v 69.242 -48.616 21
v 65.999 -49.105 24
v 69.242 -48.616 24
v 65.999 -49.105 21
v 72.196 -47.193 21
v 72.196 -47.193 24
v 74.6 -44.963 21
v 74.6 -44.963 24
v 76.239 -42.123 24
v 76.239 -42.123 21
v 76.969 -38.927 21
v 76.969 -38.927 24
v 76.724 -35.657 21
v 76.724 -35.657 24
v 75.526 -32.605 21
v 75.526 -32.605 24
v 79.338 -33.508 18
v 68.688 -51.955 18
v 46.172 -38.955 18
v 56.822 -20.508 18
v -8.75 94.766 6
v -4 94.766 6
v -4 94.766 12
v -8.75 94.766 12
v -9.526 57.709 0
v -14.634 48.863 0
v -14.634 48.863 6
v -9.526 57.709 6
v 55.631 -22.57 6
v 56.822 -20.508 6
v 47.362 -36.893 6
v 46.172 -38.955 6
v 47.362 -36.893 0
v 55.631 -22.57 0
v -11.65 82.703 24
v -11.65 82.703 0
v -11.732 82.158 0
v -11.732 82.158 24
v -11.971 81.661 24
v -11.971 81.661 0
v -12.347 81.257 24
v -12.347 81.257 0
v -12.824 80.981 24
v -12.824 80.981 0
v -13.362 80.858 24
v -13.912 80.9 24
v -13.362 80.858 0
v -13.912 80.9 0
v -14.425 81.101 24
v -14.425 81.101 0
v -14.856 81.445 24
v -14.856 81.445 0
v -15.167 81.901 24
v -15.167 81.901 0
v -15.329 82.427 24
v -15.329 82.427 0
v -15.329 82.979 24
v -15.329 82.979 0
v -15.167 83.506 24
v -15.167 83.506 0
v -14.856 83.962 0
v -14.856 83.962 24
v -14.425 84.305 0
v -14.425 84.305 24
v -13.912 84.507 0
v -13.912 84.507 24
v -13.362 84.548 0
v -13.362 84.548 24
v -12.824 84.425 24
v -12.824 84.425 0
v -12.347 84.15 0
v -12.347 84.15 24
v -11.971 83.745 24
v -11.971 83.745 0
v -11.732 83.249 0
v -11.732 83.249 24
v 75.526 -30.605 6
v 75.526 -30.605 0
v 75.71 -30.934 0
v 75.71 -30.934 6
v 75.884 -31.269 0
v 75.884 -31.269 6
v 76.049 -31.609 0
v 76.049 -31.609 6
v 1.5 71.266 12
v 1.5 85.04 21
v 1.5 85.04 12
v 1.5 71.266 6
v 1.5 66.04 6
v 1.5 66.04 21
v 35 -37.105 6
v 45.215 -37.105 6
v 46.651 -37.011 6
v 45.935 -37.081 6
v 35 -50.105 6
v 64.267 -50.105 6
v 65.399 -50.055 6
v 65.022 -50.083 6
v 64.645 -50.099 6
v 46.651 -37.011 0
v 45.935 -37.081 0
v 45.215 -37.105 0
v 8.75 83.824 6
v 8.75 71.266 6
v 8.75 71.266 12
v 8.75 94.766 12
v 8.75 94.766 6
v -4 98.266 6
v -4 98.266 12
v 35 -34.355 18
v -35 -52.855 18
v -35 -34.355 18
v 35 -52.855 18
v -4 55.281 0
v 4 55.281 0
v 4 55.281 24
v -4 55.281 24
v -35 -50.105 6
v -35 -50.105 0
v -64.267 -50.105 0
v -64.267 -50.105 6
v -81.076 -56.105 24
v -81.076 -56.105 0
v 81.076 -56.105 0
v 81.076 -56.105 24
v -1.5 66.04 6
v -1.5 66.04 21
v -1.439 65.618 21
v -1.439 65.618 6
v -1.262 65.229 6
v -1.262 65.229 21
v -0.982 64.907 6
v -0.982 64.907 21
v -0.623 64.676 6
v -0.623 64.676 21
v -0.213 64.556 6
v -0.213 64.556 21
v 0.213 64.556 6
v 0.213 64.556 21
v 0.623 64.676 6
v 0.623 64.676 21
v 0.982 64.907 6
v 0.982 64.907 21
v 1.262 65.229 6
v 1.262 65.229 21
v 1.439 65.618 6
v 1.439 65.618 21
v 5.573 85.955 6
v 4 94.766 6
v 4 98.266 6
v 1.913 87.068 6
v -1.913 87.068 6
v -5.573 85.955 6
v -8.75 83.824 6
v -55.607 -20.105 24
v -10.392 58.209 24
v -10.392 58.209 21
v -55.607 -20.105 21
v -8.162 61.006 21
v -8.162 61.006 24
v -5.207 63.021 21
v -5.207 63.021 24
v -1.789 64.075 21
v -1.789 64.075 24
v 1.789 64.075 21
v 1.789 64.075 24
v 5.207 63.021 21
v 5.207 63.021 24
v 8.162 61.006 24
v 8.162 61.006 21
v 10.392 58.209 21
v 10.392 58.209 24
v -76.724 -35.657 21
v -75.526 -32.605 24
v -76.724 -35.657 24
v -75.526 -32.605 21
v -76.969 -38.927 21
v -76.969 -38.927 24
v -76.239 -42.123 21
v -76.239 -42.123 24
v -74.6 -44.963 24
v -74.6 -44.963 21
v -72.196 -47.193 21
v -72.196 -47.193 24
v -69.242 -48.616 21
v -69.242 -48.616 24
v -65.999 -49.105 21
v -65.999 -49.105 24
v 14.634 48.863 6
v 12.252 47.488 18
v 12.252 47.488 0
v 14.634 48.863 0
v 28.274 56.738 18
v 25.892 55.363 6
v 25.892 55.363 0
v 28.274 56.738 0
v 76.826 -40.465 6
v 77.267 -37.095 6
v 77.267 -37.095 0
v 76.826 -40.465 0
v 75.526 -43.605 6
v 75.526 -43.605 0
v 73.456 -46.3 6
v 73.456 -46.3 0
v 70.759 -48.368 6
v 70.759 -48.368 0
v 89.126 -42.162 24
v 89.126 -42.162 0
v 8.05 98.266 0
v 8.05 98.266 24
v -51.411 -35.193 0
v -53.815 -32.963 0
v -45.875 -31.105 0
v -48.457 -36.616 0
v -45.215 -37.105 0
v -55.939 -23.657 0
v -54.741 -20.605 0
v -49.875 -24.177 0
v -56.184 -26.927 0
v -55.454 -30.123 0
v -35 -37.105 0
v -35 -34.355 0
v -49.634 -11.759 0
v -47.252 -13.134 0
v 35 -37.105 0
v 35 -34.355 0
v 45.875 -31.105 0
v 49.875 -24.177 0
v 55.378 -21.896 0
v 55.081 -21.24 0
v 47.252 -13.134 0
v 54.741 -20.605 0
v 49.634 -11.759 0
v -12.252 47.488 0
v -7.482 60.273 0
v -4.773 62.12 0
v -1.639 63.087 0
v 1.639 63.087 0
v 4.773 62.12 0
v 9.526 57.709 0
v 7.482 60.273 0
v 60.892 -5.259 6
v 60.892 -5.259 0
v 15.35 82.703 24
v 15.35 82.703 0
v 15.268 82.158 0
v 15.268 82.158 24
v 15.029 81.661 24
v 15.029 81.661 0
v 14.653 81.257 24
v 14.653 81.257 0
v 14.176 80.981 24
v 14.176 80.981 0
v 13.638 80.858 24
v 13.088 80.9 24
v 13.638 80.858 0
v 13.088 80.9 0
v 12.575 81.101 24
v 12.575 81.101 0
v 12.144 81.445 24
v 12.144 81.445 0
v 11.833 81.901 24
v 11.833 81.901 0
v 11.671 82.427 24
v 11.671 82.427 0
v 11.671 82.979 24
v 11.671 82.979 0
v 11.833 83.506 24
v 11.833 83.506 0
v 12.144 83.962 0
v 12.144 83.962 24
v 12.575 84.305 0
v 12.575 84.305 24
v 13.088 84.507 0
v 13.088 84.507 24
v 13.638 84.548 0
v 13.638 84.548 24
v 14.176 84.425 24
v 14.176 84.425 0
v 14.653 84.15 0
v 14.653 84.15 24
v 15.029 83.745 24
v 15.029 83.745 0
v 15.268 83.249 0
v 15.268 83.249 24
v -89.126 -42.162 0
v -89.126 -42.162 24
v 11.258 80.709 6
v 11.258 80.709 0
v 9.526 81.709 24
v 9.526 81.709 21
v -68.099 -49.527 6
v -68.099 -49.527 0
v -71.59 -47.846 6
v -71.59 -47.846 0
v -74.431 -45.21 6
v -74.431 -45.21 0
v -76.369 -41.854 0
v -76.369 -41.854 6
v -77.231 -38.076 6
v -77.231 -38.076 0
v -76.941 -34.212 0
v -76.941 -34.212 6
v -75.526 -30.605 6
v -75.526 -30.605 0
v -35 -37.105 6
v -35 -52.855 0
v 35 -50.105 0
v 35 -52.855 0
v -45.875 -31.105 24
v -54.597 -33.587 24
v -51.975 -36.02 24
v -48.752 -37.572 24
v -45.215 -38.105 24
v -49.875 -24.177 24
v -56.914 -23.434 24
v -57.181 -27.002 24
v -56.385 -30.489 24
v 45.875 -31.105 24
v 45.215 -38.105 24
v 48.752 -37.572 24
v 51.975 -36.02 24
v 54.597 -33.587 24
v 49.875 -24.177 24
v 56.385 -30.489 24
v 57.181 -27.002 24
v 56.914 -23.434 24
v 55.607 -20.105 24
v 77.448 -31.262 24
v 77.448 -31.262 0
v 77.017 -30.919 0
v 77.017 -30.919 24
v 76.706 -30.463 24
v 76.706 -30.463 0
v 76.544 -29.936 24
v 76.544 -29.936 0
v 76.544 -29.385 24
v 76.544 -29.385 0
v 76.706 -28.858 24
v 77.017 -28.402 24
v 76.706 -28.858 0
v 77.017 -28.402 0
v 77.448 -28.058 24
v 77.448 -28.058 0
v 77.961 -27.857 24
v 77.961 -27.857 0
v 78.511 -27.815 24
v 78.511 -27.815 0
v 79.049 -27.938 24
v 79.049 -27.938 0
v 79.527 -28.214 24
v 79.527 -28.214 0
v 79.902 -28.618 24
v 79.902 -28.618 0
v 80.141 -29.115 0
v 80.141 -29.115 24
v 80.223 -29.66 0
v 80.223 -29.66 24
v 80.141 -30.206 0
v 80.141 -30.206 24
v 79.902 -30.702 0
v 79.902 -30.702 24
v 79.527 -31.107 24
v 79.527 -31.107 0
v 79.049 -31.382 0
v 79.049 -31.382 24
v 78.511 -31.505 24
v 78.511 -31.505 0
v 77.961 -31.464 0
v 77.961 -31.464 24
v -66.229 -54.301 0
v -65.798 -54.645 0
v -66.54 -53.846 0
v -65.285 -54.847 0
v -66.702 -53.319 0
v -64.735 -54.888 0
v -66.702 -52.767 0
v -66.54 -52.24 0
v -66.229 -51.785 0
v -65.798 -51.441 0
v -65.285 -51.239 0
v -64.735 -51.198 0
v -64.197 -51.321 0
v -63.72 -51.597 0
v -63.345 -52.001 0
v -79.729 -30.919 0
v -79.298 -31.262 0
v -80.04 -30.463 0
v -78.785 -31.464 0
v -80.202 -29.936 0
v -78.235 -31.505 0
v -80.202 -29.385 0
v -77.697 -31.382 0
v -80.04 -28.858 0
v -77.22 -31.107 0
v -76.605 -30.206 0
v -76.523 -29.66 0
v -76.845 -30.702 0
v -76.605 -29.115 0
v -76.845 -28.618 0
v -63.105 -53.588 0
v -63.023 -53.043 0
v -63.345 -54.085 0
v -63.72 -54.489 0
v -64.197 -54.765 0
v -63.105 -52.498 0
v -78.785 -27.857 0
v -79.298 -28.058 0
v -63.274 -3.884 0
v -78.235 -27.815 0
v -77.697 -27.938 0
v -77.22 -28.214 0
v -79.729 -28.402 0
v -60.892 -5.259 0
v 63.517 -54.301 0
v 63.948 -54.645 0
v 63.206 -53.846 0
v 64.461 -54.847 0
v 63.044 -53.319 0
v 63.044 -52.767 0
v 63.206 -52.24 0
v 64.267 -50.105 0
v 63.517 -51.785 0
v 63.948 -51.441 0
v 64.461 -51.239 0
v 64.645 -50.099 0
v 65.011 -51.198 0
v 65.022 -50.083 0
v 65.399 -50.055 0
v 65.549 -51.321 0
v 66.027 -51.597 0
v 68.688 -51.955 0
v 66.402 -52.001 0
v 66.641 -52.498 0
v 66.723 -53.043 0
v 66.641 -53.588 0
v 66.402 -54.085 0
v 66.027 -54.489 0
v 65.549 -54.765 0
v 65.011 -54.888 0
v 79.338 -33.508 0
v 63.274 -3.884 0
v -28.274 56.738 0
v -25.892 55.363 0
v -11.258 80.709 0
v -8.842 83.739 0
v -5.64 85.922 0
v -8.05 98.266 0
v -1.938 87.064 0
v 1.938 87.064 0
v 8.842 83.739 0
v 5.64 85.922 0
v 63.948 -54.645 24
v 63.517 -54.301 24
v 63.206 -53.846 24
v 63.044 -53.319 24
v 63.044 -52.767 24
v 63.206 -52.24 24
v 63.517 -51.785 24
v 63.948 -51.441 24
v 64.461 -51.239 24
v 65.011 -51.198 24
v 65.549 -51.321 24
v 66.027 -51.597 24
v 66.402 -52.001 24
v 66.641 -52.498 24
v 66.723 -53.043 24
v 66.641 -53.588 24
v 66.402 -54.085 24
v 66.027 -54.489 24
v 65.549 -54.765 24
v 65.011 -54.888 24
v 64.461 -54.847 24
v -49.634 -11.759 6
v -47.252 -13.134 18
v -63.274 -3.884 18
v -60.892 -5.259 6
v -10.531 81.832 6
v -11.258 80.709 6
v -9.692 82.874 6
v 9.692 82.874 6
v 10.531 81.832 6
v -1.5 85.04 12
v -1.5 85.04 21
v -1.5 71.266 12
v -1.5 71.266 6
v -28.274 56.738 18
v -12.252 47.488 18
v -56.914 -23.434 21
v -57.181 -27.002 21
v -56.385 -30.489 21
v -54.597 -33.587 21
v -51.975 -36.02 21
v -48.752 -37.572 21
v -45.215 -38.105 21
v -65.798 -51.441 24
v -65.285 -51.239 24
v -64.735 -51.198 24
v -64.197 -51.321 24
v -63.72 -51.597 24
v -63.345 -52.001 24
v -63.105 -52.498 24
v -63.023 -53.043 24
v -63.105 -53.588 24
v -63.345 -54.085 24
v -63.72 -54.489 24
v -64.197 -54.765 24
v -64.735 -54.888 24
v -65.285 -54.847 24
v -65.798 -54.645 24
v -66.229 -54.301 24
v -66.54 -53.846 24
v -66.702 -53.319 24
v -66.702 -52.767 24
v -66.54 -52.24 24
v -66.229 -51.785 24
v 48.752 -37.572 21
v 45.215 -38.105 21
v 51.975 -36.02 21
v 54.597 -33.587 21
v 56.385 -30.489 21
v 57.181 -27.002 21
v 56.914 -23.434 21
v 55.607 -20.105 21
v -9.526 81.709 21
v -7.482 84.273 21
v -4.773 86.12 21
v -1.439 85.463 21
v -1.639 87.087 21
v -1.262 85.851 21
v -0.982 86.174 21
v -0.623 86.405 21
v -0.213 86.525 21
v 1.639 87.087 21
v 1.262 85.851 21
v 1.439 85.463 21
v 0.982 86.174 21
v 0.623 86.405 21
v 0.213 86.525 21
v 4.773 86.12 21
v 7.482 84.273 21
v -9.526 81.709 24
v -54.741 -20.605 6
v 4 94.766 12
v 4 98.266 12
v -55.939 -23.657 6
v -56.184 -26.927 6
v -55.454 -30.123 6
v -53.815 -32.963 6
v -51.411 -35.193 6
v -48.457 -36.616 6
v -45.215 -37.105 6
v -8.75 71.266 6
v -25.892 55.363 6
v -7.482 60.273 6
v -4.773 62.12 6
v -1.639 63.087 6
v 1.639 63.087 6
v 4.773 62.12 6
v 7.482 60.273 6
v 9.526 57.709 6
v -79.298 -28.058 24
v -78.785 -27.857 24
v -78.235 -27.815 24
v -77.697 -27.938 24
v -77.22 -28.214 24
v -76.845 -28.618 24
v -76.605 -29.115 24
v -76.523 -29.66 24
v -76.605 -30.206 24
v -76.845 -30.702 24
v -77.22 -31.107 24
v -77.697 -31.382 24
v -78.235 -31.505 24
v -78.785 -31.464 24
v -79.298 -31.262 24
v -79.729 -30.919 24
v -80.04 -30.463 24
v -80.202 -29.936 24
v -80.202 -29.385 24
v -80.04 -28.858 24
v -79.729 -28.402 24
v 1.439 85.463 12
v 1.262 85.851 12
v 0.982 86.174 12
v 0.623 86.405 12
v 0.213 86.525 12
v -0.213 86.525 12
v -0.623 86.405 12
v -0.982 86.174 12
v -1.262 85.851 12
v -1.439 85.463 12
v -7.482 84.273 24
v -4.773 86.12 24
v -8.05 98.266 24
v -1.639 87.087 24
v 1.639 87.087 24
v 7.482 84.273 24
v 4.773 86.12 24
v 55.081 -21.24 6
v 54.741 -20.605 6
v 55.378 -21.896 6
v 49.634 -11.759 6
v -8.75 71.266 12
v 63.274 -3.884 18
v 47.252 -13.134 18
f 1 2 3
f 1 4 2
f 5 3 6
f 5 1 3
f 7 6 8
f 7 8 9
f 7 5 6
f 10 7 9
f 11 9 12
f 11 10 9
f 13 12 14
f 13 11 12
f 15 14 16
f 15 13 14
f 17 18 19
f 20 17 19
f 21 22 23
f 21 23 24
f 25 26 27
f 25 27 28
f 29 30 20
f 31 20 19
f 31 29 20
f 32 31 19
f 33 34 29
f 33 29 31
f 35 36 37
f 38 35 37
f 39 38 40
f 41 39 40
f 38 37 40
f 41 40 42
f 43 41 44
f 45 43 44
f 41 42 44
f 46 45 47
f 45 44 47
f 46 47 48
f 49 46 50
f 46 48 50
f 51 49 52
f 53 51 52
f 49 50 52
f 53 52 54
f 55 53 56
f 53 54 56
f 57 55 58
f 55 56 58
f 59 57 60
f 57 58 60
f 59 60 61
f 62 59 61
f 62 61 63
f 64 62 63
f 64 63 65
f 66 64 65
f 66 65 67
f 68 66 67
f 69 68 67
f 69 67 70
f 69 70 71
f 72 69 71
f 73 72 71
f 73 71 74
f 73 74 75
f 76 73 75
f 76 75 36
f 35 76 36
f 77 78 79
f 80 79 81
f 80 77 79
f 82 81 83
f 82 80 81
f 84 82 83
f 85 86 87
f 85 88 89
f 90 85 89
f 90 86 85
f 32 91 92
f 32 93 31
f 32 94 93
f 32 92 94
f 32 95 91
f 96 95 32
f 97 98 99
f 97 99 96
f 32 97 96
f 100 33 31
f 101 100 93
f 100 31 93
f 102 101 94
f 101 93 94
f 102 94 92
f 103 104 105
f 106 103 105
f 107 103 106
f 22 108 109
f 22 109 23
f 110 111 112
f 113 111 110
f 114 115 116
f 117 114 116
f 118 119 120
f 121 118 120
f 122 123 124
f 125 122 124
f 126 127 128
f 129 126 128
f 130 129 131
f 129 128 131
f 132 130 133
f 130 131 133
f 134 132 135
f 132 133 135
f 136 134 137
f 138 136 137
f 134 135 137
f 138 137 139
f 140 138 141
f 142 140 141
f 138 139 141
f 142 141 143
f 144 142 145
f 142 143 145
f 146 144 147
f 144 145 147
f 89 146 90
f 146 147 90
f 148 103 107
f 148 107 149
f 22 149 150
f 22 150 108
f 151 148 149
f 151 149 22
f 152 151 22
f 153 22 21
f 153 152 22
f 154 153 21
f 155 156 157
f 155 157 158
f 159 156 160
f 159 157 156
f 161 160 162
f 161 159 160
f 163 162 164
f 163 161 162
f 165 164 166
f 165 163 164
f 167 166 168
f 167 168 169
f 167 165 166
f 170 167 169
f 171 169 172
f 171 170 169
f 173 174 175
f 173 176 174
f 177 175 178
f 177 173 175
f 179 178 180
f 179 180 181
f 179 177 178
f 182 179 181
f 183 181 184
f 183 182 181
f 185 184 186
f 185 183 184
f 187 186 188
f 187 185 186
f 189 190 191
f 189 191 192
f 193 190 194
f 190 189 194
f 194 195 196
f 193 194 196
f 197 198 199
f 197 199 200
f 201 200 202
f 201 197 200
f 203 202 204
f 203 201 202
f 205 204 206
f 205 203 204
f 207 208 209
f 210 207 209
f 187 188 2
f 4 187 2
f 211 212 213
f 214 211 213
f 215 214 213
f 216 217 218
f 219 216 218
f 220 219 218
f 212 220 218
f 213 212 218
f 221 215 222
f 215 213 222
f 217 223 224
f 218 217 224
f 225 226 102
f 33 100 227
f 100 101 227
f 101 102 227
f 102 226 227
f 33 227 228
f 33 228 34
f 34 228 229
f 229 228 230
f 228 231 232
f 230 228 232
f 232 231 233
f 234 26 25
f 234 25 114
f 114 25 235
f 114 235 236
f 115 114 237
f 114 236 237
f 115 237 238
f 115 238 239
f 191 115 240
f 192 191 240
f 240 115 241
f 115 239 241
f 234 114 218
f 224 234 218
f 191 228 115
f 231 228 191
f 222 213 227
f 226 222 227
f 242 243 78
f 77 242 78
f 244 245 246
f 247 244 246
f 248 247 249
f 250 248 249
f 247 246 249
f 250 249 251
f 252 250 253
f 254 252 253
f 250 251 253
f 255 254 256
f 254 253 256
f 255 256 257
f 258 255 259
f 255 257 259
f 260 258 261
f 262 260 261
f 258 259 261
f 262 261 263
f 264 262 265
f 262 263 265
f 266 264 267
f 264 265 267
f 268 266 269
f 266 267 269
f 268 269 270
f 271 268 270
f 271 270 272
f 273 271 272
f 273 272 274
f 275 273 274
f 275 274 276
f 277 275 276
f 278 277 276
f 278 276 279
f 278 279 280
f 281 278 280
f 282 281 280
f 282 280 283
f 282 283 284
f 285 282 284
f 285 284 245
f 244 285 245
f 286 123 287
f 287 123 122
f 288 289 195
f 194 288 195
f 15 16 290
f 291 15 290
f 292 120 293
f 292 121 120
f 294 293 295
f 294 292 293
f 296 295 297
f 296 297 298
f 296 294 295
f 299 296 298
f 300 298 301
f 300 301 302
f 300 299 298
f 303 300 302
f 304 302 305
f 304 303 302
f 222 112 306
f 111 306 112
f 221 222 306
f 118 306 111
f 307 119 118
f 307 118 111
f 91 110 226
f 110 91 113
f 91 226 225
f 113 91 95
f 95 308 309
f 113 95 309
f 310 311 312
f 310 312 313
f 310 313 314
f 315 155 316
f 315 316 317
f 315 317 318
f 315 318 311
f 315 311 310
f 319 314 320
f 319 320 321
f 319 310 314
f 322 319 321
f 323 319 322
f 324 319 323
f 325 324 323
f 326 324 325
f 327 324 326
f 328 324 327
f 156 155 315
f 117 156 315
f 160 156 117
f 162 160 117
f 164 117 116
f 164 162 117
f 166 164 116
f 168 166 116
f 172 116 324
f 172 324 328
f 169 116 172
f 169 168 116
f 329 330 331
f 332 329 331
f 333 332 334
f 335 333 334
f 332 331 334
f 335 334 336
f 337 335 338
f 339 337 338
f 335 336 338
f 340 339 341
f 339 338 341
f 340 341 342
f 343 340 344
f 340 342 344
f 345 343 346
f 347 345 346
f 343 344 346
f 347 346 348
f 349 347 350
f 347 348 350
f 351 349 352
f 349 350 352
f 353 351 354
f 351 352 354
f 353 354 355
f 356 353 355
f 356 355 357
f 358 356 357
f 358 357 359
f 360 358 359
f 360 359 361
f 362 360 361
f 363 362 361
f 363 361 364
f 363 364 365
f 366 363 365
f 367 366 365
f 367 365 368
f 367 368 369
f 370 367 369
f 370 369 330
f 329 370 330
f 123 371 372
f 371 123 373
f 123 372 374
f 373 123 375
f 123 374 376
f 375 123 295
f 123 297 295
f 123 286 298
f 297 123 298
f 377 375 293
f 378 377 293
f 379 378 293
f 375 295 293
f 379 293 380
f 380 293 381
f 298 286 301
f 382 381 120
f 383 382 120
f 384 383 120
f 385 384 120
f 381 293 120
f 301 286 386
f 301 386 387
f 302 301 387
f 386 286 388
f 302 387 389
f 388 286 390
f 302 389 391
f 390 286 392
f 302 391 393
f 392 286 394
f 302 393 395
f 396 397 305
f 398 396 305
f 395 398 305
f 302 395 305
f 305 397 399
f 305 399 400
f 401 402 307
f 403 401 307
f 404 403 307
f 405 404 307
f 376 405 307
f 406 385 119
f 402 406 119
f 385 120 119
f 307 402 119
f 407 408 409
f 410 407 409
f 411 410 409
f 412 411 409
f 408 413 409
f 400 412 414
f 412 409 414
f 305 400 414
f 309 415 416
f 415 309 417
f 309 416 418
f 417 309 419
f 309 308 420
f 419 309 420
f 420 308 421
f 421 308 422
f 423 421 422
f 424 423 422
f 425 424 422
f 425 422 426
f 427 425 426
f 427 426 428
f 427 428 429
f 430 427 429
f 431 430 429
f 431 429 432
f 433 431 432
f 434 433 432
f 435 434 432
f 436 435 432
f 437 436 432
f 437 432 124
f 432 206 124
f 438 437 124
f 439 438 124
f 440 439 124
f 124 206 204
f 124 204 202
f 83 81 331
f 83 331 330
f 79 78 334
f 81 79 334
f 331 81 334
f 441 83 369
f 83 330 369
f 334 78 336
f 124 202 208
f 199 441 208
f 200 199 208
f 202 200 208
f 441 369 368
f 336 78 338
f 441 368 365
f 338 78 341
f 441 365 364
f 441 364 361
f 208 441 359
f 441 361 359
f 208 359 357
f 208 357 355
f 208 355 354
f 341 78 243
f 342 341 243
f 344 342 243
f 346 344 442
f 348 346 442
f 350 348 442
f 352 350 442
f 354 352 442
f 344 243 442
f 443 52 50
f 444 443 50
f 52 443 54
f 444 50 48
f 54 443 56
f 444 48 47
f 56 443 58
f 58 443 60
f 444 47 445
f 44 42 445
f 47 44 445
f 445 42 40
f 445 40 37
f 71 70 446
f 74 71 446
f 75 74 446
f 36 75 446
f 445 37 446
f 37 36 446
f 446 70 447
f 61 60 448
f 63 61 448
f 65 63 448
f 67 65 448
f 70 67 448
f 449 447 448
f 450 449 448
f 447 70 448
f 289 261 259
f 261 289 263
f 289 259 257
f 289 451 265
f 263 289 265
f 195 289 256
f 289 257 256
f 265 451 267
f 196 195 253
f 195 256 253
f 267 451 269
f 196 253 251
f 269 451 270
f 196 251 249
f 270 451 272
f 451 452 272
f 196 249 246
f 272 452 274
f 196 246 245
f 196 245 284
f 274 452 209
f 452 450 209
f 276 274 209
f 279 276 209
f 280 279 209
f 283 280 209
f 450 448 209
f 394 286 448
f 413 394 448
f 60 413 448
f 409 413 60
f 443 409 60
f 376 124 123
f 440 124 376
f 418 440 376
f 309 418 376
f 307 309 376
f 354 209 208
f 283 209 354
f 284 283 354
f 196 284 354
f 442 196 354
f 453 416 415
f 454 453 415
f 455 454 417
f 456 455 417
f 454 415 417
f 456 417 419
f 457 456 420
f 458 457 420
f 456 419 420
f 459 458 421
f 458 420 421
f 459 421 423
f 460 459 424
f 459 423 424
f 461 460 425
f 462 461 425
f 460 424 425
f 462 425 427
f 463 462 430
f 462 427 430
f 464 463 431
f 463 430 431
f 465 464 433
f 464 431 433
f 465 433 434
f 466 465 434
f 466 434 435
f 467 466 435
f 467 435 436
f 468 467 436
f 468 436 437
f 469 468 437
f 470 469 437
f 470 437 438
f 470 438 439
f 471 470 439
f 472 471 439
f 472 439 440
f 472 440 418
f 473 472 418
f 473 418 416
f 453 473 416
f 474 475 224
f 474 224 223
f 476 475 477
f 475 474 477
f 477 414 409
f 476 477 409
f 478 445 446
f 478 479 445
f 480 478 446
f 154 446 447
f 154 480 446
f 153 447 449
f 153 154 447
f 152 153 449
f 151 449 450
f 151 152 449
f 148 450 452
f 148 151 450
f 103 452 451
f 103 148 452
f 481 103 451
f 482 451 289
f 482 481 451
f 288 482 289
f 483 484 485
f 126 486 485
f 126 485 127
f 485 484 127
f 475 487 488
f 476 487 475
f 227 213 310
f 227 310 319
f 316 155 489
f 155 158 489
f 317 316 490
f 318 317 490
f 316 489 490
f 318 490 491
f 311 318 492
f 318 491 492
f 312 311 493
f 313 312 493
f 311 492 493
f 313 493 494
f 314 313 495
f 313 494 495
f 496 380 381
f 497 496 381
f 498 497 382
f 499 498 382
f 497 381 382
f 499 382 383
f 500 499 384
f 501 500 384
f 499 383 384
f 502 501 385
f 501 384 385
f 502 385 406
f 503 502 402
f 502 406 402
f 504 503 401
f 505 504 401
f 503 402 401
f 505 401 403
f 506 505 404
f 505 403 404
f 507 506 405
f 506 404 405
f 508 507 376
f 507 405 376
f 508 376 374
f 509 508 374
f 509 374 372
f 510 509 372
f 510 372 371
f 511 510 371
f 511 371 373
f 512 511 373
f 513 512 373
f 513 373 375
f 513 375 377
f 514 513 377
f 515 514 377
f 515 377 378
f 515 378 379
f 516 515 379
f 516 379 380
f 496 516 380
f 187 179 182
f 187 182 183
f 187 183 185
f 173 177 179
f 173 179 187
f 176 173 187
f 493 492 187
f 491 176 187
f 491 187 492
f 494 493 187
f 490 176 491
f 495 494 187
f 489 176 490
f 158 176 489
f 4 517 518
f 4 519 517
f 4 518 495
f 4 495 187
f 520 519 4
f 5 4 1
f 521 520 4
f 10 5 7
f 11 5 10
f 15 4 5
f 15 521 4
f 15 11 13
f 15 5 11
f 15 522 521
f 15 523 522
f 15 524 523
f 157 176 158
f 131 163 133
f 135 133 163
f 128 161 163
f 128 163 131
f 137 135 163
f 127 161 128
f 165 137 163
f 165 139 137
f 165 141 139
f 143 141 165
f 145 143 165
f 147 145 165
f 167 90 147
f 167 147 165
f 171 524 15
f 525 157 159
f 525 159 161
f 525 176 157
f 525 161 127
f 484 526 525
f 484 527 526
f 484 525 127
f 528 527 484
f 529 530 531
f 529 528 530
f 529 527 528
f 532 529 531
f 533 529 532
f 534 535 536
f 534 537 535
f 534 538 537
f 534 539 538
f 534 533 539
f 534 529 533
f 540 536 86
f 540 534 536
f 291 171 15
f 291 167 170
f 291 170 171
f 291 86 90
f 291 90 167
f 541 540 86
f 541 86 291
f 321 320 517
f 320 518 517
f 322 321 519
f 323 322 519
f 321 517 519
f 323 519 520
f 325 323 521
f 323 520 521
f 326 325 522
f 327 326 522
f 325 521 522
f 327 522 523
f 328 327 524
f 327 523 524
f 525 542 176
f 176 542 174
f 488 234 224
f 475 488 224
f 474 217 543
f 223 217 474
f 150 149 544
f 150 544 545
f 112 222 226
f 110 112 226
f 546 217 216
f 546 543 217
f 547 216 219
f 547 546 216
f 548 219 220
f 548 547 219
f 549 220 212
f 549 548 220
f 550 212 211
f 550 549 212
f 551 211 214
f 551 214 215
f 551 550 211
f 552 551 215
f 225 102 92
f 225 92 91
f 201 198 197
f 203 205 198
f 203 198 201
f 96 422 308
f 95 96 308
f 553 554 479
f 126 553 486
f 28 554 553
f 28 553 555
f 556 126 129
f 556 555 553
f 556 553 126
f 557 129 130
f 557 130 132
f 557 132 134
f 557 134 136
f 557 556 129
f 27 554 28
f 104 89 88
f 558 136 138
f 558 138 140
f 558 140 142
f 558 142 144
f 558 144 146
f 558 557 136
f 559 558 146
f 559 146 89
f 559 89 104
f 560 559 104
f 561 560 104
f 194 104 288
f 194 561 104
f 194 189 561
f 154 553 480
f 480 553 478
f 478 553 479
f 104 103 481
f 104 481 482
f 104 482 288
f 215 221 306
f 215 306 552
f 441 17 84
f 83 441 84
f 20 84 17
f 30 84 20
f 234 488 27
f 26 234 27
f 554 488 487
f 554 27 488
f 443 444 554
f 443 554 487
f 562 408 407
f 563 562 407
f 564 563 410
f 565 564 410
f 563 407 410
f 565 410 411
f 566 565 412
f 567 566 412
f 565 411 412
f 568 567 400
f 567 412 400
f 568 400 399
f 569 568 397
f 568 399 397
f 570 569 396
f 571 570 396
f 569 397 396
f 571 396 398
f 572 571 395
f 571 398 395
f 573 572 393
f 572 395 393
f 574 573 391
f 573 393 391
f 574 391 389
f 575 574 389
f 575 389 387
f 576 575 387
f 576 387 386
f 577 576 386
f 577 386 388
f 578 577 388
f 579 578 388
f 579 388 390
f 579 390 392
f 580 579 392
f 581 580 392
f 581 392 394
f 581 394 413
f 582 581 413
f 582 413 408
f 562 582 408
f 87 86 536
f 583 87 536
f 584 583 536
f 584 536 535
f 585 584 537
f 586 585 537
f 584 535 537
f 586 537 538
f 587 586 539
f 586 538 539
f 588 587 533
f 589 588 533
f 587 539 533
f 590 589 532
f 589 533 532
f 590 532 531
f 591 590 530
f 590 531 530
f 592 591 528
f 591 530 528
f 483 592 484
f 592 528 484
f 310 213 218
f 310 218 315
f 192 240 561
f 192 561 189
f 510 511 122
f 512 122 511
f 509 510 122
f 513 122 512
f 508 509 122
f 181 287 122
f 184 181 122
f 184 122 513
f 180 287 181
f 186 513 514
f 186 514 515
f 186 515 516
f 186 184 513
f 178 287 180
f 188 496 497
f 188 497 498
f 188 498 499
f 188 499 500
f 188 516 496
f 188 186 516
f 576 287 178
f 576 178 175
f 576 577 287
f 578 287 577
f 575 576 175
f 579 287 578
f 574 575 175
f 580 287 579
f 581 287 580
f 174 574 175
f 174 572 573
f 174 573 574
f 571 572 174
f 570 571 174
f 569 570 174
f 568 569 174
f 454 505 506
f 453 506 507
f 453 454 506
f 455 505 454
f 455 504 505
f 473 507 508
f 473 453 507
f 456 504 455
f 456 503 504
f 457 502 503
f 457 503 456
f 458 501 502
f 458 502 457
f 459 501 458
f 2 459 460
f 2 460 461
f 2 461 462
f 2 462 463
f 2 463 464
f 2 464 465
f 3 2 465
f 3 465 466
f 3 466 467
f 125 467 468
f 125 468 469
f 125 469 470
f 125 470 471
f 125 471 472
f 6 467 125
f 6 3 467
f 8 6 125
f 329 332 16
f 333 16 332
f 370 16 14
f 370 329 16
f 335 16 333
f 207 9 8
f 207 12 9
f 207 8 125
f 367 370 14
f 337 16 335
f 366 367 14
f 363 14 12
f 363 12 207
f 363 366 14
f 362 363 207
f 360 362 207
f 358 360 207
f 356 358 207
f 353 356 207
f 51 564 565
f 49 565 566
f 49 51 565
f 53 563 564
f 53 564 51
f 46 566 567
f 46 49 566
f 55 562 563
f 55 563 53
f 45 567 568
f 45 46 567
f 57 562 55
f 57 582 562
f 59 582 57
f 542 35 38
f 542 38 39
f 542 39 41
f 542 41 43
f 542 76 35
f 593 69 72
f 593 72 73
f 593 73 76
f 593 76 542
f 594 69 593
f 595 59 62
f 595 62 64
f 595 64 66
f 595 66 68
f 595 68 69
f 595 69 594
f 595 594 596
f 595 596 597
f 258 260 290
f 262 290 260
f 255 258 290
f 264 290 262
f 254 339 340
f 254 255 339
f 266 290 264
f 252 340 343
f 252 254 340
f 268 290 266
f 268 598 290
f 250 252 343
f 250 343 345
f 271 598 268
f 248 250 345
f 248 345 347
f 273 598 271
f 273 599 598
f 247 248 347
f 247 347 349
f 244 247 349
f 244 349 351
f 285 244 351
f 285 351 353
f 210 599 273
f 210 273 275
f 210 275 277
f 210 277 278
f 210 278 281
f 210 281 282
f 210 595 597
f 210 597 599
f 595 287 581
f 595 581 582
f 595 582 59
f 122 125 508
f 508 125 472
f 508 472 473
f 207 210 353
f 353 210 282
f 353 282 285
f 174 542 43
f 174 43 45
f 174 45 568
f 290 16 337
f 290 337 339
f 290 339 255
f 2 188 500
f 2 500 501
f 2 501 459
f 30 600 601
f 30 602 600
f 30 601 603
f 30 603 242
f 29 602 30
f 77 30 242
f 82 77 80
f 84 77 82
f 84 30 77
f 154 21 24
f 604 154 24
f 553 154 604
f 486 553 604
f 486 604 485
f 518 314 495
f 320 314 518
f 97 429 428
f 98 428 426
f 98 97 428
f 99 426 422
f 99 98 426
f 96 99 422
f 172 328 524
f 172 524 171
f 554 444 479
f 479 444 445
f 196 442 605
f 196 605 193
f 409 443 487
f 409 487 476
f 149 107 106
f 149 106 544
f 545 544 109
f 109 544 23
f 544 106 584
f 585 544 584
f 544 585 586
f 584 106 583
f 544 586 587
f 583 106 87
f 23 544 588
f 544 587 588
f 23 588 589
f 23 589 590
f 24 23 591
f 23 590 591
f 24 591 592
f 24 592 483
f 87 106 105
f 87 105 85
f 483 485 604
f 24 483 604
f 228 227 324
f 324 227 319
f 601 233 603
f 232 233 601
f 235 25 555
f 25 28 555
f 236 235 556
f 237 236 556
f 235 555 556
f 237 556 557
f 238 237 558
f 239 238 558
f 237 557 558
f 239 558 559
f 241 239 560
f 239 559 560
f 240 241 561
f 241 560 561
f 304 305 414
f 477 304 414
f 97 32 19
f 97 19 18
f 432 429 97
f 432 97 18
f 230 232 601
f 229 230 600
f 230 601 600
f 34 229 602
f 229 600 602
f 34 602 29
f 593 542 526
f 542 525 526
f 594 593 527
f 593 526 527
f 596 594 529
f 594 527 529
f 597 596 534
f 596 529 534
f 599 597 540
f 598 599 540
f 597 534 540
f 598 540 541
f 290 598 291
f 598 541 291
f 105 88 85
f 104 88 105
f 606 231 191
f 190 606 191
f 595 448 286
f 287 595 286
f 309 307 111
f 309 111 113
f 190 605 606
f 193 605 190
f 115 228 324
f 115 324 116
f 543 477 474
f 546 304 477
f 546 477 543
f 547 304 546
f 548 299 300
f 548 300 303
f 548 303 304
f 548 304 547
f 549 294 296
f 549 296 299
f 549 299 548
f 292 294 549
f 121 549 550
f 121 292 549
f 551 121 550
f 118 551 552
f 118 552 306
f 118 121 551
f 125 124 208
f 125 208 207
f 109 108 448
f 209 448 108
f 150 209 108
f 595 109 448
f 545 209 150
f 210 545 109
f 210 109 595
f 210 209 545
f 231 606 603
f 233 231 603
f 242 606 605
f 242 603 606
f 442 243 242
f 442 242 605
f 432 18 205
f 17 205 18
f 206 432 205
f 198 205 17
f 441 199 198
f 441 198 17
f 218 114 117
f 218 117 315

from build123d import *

# Parameters (mm, degrees)
PAD_DEPTH             = 24
POCKET_DEPTH          = 3
SKETCH002_W           = 70
SKETCH002_H           = 18.5
POCKET001_DEPTH       = 18
POLARPATTERN_COUNT    = 3
POCKET002_DEPTH       = 6
CHAMFER_SIZE          = 8
FILLET_R              = 13
FILLET001_R           = 11
CHAMFER001_SIZE       = 16.1
FILLET002_R           = 11
FILLET003_R           = 12
POCKET003_DEPTH       = 6
POCKET004_DEPTH       = 18
POCKET005_DEPTH       = 21.001
SKETCH012_R           = 1.85
POCKET011_DEPTH       = 498.049286
POLARPATTERN001_COUNT = 3


with BuildPart() as part:
    # Sketch → Pad (new body)
    with BuildSketch(Plane.XY):
        Polygon((0, 112.209492), (-97.17627, -56.104746), (97.17627, -56.104746), align=None)
        Polygon((0, 62.209492), (-53.875, -31.104746), (53.875, -31.104746), align=None, mode=Mode.SUBTRACT)
    extrude(amount=PAD_DEPTH)

    # Sketch001 (on Face8 of Pad) → Pocket (cut)
    with BuildSketch(Plane.XY.offset(24)):
        Polygon((0, 98.209492), (-85.051915, -49.104746), (85.051915, -49.104746), align=None)
        Polygon((0, 76.209492), (-65.999356, -38.104746), (65.999356, -38.104746), align=None, mode=Mode.SUBTRACT)
    extrude(amount=-POCKET_DEPTH, mode=Mode.SUBTRACT)

    # Sketch002 (on Face4 of Pocket) → Pocket001 (cut)
    with BuildSketch(Plane(origin=(0, 0, 0), x_dir=(1, 0, 0), z_dir=(0, 0, -1))):
        with Locations((0, 43.604746)):
            Rectangle(SKETCH002_W, SKETCH002_H)
    pocket001 = extrude(amount=-POCKET001_DEPTH, mode=Mode.SUBTRACT)

    # PolarPattern: Pocket001 ×3 about axis
    polarpattern_axis = Axis((0, 0, 0), (0, 0, -1))
    for i in range(1, POLARPATTERN_COUNT):
        add(pocket001.rotate(polarpattern_axis, i * 360 / POLARPATTERN_COUNT), mode=Mode.SUBTRACT)

    # Sketch003 (on Face4 of PolarPattern) → Pocket002 (cut)
    with BuildSketch(Plane(origin=(0, 0, 0), x_dir=(1, 0, 0), z_dir=(0, 0, -1))):
        Polygon((0, -100.209492), (86.783965, 50.104746), (-86.783965, 50.104746), align=None)
        Polygon((0, -74.209492), (64.267305, 37.104746), (-64.267305, 37.104746), align=None, mode=Mode.SUBTRACT)
    extrude(amount=-POCKET002_DEPTH, mode=Mode.SUBTRACT)

    # Chamfer
    chamfer_edges = [part.edges().sort_by_distance(p)[0] for p in [
        (-53.875, -31.104746, 12),
        (53.875, -31.104746, 12),
        (0, 62.209492, 12),
    ]]
    chamfer(chamfer_edges, length=CHAMFER_SIZE)

    # Fillet
    fillet_edges = [part.edges().sort_by_distance(p)[0] for p in [
        (0, 100.209492, 3),
        (-86.783965, -50.104746, 3),
        (86.783965, -50.104746, 3),
    ]]
    fillet(fillet_edges, radius=FILLET_R)

    # Fillet001
    fillet001_edges = [part.edges().sort_by_distance(p)[0] for p in [
        (0, 74.209492, 3),
        (64.267305, -37.104746, 3),
        (-64.267305, -37.104746, 3),
    ]]
    fillet(fillet001_edges, radius=FILLET001_R)

    # Chamfer001
    chamfer001_edges = [part.edges().sort_by_distance(p)[0] for p in [
        (97.17627, -56.104746, 12),
        (0, 112.209492, 12),
        (-97.17627, -56.104746, 12),
    ]]
    chamfer(chamfer001_edges, length=CHAMFER001_SIZE)

    # Fillet002
    fillet002_edges = [part.edges().sort_by_distance(p)[0] for p in [
        (0, 98.209492, 22.5),
        (-85.051915, -49.104746, 22.5),
        (85.051915, -49.104746, 22.5),
    ]]
    fillet(fillet002_edges, radius=FILLET002_R)

    # Fillet003
    fillet003_edges = [part.edges().sort_by_distance(p)[0] for p in [
        (65.999356, -38.104746, 22.5),
        (0, 76.209492, 22.5),
        (-65.999356, -38.104746, 22.5),
    ]]
    fillet(fillet003_edges, radius=FILLET003_R)

    # Sketch004 (on Face60 of Fillet003) → Pocket003 (cut)
    with BuildSketch(Plane(origin=(0, 0, 6), x_dir=(1, 0, 0), z_dir=(0, 0, -1))):
        Polygon((-8.75, -71.266483), (8.75, -71.266483), (8.75, -94.766483), (4, -94.766483), (4, -98.266483), (-4, -98.266483), (-4, -94.766483), (-8.75, -94.766483), align=None)
    extrude(amount=-POCKET003_DEPTH, mode=Mode.SUBTRACT)

    # Sketch005 (on Face29 of Pocket003) → Pocket004 (cut)
    with BuildSketch(Plane(origin=(0, 0, 0), x_dir=(1, 0, 0), z_dir=(0, 0, -1))):
        Polygon((46.171599, 38.954746), (68.688259, 51.954746), (79.338259, 33.508405), (56.821599, 20.508405), align=None)
    extrude(amount=-POCKET004_DEPTH, mode=Mode.SUBTRACT)

    # Sketch006 (on Face1 of Pocket004) → Pocket005 (cut, through all)
    with BuildSketch(Plane.XY.offset(21)):
        with BuildLine():
            ThreePointArc((1.5, 85.040452), (0, 86.540452), (-1.5, 85.040452))
            Line((-1.5, 85.040452), (-1.5, 66.040452))
            ThreePointArc((-1.5, 66.040452), (0, 64.540452), (1.5, 66.040452))
            Line((1.5, 85.040452), (1.5, 66.040452))
        make_face()
    extrude(amount=-POCKET005_DEPTH, mode=Mode.SUBTRACT)

    # Sketch012 → Pocket011 (cut, through all)
    with BuildSketch(Plane(origin=(0, 0, 0), x_dir=(1, 0, 0), z_dir=(0, 0, -1))):
        with Locations((-13.5, -82.703211)):
            Circle(SKETCH012_R)
        with Locations((13.5, -82.703211)):
            Circle(SKETCH012_R)
    pocket011 = extrude(amount=-POCKET011_DEPTH, mode=Mode.SUBTRACT)

    # PolarPattern001: Pocket011 ×3 about axis
    polarpattern001_axis = Axis((0, 0, 0), (0, 0, -1))
    for i in range(1, POLARPATTERN001_COUNT):
        add(pocket011.rotate(polarpattern001_axis, i * 360 / POLARPATTERN001_COUNT), mode=Mode.SUBTRACT)


solid = part.part
